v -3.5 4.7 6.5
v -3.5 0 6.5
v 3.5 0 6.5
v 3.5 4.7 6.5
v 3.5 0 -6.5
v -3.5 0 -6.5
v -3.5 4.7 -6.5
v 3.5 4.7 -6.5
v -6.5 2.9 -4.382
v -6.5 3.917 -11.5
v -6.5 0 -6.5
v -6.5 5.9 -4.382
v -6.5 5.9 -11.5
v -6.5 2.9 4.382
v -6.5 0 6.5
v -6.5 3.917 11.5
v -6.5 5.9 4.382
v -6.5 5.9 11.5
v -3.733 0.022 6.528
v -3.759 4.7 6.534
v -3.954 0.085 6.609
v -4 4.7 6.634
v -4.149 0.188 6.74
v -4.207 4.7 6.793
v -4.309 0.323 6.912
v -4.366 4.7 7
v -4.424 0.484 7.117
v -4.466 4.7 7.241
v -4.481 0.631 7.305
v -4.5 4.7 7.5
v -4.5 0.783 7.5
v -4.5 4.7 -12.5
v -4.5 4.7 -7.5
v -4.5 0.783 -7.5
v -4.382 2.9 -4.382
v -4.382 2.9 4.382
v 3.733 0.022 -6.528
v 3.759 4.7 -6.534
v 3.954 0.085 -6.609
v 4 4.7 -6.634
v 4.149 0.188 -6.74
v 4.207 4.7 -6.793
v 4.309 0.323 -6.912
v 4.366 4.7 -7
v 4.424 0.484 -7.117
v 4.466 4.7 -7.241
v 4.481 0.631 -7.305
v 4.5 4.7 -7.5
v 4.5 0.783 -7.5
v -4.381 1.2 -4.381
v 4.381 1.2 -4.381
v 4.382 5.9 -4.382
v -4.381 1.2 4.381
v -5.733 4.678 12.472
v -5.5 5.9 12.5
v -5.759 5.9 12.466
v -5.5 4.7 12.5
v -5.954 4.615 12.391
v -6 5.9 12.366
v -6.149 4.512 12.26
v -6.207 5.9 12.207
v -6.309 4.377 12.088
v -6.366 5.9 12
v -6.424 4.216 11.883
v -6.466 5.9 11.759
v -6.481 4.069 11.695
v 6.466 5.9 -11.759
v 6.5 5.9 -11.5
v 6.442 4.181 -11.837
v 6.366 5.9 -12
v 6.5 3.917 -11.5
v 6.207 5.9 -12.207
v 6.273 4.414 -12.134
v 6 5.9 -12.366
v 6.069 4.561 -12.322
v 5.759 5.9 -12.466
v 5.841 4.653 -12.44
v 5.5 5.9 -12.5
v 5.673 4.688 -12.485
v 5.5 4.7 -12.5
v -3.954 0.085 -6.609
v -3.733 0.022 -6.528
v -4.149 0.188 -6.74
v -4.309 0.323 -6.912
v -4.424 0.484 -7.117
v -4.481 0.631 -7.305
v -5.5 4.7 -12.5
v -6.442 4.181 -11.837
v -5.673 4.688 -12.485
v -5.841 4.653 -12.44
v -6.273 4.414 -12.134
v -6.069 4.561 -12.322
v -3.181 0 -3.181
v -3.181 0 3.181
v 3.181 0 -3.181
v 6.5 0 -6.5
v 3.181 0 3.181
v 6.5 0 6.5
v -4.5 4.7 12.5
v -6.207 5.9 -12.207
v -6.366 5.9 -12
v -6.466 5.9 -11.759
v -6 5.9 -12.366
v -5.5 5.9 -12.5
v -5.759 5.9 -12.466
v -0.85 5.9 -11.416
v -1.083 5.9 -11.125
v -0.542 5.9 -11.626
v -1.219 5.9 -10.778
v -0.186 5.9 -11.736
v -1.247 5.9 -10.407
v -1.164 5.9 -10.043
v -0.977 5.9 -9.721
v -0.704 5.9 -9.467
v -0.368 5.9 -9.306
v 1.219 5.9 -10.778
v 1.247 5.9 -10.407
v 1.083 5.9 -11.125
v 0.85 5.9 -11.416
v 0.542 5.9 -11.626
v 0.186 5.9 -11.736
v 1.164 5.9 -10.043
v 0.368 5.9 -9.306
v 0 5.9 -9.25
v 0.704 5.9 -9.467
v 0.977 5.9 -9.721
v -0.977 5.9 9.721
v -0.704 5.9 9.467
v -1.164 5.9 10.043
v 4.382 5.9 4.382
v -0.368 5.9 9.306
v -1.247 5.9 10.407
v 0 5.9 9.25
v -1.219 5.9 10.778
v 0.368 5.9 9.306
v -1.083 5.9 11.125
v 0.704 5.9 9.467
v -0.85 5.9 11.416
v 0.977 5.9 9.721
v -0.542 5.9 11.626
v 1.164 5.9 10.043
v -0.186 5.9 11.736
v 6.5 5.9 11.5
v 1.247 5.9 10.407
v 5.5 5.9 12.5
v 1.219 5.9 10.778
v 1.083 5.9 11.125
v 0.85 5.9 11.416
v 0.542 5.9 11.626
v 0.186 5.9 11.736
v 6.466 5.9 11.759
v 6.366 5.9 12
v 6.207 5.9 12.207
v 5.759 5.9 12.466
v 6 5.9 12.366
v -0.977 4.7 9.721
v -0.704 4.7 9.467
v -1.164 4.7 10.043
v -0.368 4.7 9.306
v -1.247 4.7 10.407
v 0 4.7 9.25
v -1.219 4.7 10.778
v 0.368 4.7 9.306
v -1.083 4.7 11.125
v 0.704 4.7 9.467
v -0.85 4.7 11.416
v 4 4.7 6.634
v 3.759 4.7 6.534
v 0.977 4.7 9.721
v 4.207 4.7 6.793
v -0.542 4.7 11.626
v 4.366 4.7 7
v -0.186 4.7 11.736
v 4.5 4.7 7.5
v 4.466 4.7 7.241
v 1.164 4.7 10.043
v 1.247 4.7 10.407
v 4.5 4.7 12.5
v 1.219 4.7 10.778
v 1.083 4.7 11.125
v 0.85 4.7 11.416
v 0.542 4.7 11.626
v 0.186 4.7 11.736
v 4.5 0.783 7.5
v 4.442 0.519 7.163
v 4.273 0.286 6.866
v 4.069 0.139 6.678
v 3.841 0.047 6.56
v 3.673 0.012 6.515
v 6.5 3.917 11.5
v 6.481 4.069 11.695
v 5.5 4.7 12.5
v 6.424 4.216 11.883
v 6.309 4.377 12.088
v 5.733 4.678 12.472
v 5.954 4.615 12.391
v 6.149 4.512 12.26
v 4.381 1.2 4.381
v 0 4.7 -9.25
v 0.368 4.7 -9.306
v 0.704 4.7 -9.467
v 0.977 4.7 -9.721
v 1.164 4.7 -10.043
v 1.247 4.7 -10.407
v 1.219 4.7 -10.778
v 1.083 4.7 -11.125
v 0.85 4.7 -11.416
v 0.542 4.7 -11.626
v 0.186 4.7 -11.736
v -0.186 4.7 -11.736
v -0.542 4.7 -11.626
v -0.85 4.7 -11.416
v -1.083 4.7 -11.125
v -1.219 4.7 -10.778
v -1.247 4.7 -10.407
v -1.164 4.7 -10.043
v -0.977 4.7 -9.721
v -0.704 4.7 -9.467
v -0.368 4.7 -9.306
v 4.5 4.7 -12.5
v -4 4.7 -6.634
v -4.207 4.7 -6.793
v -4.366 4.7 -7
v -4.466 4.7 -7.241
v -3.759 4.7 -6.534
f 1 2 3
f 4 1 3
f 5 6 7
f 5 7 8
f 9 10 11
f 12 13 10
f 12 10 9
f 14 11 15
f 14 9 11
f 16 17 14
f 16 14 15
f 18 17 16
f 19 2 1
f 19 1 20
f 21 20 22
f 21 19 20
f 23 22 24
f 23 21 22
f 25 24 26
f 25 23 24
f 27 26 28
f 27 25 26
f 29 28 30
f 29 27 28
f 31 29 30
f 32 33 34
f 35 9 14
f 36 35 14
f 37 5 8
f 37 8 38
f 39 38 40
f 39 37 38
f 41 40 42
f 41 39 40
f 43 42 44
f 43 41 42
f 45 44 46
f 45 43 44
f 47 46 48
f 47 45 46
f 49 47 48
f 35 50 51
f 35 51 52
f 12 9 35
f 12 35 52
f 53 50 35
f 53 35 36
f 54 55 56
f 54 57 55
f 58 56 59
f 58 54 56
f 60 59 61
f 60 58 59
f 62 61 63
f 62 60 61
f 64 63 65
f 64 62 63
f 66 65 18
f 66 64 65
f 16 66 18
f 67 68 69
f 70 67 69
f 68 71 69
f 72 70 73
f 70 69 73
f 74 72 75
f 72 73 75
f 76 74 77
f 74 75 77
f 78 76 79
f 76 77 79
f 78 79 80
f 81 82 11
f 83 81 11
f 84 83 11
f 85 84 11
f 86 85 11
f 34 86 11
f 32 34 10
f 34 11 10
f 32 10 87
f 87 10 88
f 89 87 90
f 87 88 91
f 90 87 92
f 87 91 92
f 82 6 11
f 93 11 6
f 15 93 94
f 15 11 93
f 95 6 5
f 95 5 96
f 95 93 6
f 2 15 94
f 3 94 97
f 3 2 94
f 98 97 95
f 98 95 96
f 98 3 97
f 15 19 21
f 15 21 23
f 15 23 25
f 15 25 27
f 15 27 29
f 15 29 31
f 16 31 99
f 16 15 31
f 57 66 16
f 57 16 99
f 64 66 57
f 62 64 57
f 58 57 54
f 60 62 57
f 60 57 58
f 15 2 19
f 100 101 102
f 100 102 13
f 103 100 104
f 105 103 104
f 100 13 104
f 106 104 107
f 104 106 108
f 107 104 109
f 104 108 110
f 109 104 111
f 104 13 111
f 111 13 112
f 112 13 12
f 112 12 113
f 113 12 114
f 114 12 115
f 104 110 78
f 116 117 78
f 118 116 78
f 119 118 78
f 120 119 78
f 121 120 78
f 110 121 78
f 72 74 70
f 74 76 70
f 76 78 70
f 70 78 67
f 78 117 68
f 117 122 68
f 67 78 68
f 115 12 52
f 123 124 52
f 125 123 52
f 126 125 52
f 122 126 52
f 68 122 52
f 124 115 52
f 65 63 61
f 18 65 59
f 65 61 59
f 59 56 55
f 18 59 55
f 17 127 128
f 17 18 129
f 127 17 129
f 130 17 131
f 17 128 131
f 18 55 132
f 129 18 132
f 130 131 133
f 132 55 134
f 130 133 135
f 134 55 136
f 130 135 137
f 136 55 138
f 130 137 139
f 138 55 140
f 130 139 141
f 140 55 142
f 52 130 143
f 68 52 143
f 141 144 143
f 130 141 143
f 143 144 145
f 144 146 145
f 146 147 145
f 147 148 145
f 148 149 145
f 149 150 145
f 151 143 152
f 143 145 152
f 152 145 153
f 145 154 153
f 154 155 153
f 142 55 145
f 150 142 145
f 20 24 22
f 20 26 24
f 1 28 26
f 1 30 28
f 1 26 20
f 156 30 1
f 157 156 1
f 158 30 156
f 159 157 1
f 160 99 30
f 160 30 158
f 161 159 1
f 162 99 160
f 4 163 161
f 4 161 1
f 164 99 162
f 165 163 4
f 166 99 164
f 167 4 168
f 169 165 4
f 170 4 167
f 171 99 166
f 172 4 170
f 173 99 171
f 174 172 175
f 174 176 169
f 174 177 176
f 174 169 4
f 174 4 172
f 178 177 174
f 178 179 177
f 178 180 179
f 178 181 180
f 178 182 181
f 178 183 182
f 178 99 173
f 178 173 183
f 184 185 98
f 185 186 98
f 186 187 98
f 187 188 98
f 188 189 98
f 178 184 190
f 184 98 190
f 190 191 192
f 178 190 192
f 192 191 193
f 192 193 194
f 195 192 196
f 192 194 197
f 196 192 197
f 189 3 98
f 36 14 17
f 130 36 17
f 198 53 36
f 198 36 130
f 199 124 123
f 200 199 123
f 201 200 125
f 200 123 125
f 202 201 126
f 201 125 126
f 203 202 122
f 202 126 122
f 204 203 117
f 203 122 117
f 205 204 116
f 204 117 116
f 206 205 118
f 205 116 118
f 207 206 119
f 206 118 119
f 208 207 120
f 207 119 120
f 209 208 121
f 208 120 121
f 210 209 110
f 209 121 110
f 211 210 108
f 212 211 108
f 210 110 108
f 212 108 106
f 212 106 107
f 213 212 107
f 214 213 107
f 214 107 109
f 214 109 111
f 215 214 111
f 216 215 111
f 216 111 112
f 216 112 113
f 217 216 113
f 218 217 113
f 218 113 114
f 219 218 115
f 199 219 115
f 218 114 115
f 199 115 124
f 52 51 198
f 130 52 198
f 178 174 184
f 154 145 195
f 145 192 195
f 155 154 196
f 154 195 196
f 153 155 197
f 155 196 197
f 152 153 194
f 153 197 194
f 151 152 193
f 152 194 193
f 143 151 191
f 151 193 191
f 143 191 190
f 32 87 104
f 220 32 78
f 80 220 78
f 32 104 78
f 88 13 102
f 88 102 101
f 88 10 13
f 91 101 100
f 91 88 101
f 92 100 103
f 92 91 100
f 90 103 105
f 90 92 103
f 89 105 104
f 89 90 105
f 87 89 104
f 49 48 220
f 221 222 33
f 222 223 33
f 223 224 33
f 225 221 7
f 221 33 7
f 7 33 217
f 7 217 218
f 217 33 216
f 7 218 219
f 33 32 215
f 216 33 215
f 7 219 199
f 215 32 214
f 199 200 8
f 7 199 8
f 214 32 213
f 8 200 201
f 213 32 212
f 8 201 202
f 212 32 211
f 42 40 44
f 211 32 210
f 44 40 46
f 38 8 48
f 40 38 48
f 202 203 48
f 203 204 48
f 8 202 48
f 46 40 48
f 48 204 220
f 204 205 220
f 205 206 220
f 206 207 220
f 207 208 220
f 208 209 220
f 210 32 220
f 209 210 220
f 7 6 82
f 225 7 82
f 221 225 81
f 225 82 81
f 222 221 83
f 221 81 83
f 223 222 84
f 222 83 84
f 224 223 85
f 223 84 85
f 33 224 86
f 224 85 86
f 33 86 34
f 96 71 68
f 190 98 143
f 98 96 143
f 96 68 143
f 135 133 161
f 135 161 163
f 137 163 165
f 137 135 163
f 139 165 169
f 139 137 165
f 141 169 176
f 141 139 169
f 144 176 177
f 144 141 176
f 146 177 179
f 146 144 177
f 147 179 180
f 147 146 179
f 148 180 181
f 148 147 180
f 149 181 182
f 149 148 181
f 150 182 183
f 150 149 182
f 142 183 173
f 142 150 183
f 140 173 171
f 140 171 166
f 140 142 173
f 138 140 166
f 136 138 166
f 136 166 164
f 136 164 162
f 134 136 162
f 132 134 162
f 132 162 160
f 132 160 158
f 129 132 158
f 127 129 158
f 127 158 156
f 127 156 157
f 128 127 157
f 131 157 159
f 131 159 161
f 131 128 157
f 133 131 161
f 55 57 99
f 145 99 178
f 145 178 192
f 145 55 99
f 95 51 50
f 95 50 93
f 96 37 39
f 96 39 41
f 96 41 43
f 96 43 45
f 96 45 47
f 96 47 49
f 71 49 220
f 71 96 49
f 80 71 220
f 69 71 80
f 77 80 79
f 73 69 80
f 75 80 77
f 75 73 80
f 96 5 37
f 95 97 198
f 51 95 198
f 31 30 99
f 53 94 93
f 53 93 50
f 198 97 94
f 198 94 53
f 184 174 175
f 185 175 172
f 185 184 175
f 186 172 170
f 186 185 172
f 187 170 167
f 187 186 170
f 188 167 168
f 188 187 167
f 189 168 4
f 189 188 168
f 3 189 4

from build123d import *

# Parameters (mm, degrees)
SKETCH1_W           = 8.763
SKETCH1_H           = 8.763
SKETCH1_W_2         = 5.763
SKETCH1_H_2         = 5.763
BOSS_EXTRUDE1_DEPTH = 1.2
SKETCH2_W           = 13
SKETCH2_H           = 13
SKETCH2_W_2         = 8.763
SKETCH2_H_2         = 8.763
BOSS_EXTRUDE3_DEPTH = 5.9
CHAMFER1_SIZE       = 1.5
SKETCH3_W           = 13
SKETCH3_H           = 6
SKETCH3_R           = 1.25
BOSS_EXTRUDE4_DEPTH = 1.2
BOSS_EXTRUDE5_DEPTH = 2
FILLET1_R           = 1
CUT_EXTRUDE1_REACH  = 20.975
SKETCH4_W           = 8.763
SKETCH4_H           = 3


with BuildPart() as part:
    # Sketch1 → Boss-Extrude1 (new body)
    with BuildSketch(Plane(origin=(0, 0, 0), x_dir=(1, 0, 0), z_dir=(0, 1, 0))):
        Rectangle(SKETCH1_W, SKETCH1_H)
        Rectangle(SKETCH1_W_2, SKETCH1_H_2, mode=Mode.SUBTRACT)
    extrude(amount=BOSS_EXTRUDE1_DEPTH)

    # Sketch2 → Boss-Extrude3 (add)
    with BuildSketch(Plane.XZ):
        Rectangle(SKETCH2_W, SKETCH2_H)
        Rectangle(SKETCH2_W_2, SKETCH2_H_2, mode=Mode.SUBTRACT)
    extrude(amount=-BOSS_EXTRUDE3_DEPTH)

    # Chamfer1
    # the kernel refuses this chamfer: 1.5 mm, written as the material it takes off along each edge
    with BuildSketch(Plane(origin=(2.8815, 1.2, -2.8815), x_dir=(0, 0.02749587661058634, -0.9996219169112968), z_dir=(-1, 0, 0))) as chamfer1_piece_1_section:
        Polygon((CHAMFER1_SIZE * 0.999621916911, CHAMFER1_SIZE * 0.0274958766106), (-CHAMFER1_SIZE * 0.0274958766106, CHAMFER1_SIZE * 0.999621916911), (0, 0), align=None)
    chamfer1_piece_1 = extrude(amount=5.763, mode=Mode.PRIVATE)
    chamfer1_piece_1 = split(chamfer1_piece_1, bisect_by=Plane(origin=(0, 0.704393769, -4.3815), z_dir=(0, 0, 1)), keep=Keep.TOP, mode=Mode.PRIVATE)
    add(chamfer1_piece_1, mode=Mode.SUBTRACT)
    with BuildSketch(Plane(origin=(2.8815, 1.2, 2.8815), x_dir=(-0.02749587661058649, -0.9996219169112968, 0), z_dir=(0, 0, -1))) as chamfer1_piece_2_section:
        Polygon((CHAMFER1_SIZE * 0.999621916911, -CHAMFER1_SIZE * 0.0274958766106), (-CHAMFER1_SIZE * 0.0274958766106, -CHAMFER1_SIZE * 0.999621916911), (0, 0), align=None)
    chamfer1_piece_2 = extrude(amount=5.763, mode=Mode.PRIVATE)
    chamfer1_piece_2 = split(chamfer1_piece_2, bisect_by=Plane(origin=(4.3815, 0.704393769, 0), z_dir=(-1, 0, 0)), keep=Keep.TOP, mode=Mode.PRIVATE)
    add(chamfer1_piece_2, mode=Mode.SUBTRACT)
    with BuildSketch(Plane(origin=(-2.8815, 1.2, 2.8815), x_dir=(0, -0.9996219169112968, -0.02749587661058649), z_dir=(1, 0, 0))) as chamfer1_piece_3_section:
        Polygon((CHAMFER1_SIZE * 0.999621916911, -CHAMFER1_SIZE * 0.0274958766106), (-CHAMFER1_SIZE * 0.0274958766106, -CHAMFER1_SIZE * 0.999621916911), (0, 0), align=None)
    chamfer1_piece_3 = extrude(amount=5.763, mode=Mode.PRIVATE)
    chamfer1_piece_3 = split(chamfer1_piece_3, bisect_by=Plane(origin=(0, 0.704393769, 4.3815), z_dir=(0, 0, -1)), keep=Keep.TOP, mode=Mode.PRIVATE)
    add(chamfer1_piece_3, mode=Mode.SUBTRACT)
    with BuildSketch(Plane(origin=(-2.8815, 1.2, -2.8815), x_dir=(0.02749587661058649, -0.9996219169112968, 0), z_dir=(0, 0, 1))) as chamfer1_piece_4_section:
        Polygon((CHAMFER1_SIZE * 0.999621916911, -CHAMFER1_SIZE * 0.0274958766106), (-CHAMFER1_SIZE * 0.0274958766106, -CHAMFER1_SIZE * 0.999621916911), (0, 0), align=None)
    chamfer1_piece_4 = extrude(amount=5.763, mode=Mode.PRIVATE)
    chamfer1_piece_4 = split(chamfer1_piece_4, bisect_by=Plane(origin=(-4.3815, 0.704393769, 0), z_dir=(1, 0, 0)), keep=Keep.TOP, mode=Mode.PRIVATE)
    add(chamfer1_piece_4, mode=Mode.SUBTRACT)
    with BuildSketch(Plane(origin=(2.8815, 1.2, 2.8815), x_dir=(-0.02749587661058649, -0.9996219169112968, 0), z_dir=(0, 0, -1))) as chamfer1_piece_5a_section:
        Polygon((CHAMFER1_SIZE * 0.999621916911, -CHAMFER1_SIZE * 0.0274958766106), (-CHAMFER1_SIZE * 0.0274958766106, -CHAMFER1_SIZE * 0.999621916911), (0, 0), align=None)
    chamfer1_piece_5a = extrude(amount=9.620524482, mode=Mode.PRIVATE)
    chamfer1_piece_5a = split(chamfer1_piece_5a, bisect_by=Plane(origin=(3.374451501, 0.704393769, -2.8815), z_dir=(0, 0, -1)), keep=Keep.TOP, mode=Mode.PRIVATE)
    chamfer1_piece_5a = split(chamfer1_piece_5a, bisect_by=Plane(origin=(3.374451501, 0.704393769, -4.3815), z_dir=(0, 0, 1)), keep=Keep.TOP, mode=Mode.PRIVATE)
    chamfer1_piece_5a = split(chamfer1_piece_5a, bisect_by=Plane(origin=(4.3815, 0.704393769, -3.6315), z_dir=(-1, 0, 0)), keep=Keep.TOP, mode=Mode.PRIVATE)
    with BuildSketch(Plane(origin=(6.739024482, 1.2, -2.8815), x_dir=(0, 0.02749587661058634, -0.9996219169112968), z_dir=(-1, 0, 0))) as chamfer1_piece_5b_section:
        Polygon((CHAMFER1_SIZE * 0.999621916911, CHAMFER1_SIZE * 0.0274958766106), (-CHAMFER1_SIZE * 0.0274958766106, CHAMFER1_SIZE * 0.999621916911), (0, 0), align=None)
    chamfer1_piece_5b = extrude(amount=9.620524482, mode=Mode.PRIVATE)
    chamfer1_piece_5b = split(chamfer1_piece_5b, bisect_by=Plane(origin=(2.8815, 0.704393769, -3.374451501), z_dir=(1, 0, 0)), keep=Keep.TOP, mode=Mode.PRIVATE)
    chamfer1_piece_5b = split(chamfer1_piece_5b, bisect_by=Plane(origin=(3.6315, 0.704393769, -4.3815), z_dir=(0, 0, 1)), keep=Keep.TOP, mode=Mode.PRIVATE)
    chamfer1_piece_5b = split(chamfer1_piece_5b, bisect_by=Plane(origin=(4.3815, 0.704393769, -3.374451501), z_dir=(-1, 0, 0)), keep=Keep.TOP, mode=Mode.PRIVATE)
    chamfer1_piece_5 = chamfer1_piece_5a & chamfer1_piece_5b
    add(chamfer1_piece_5, mode=Mode.SUBTRACT)
    with BuildSketch(Plane(origin=(-2.8815, 1.2, -6.739024482), x_dir=(0.02749587661058649, -0.9996219169112968, 0), z_dir=(0, 0, 1))) as chamfer1_piece_6a_section:
        Polygon((CHAMFER1_SIZE * 0.999621916911, -CHAMFER1_SIZE * 0.0274958766106), (-CHAMFER1_SIZE * 0.0274958766106, -CHAMFER1_SIZE * 0.999621916911), (0, 0), align=None)
    chamfer1_piece_6a = extrude(amount=9.620524482, mode=Mode.PRIVATE)
    chamfer1_piece_6a = split(chamfer1_piece_6a, bisect_by=Plane(origin=(-3.374451501, 0.704393769, -2.8815), z_dir=(0, 0, -1)), keep=Keep.TOP, mode=Mode.PRIVATE)
    chamfer1_piece_6a = split(chamfer1_piece_6a, bisect_by=Plane(origin=(-3.374451501, 0.704393769, -4.3815), z_dir=(0, 0, 1)), keep=Keep.TOP, mode=Mode.PRIVATE)
    chamfer1_piece_6a = split(chamfer1_piece_6a, bisect_by=Plane(origin=(-4.3815, 0.704393769, -3.6315), z_dir=(1, 0, 0)), keep=Keep.TOP, mode=Mode.PRIVATE)
    with BuildSketch(Plane(origin=(2.8815, 1.2, -2.8815), x_dir=(0, 0.02749587661058634, -0.9996219169112968), z_dir=(-1, 0, 0))) as chamfer1_piece_6b_section:
        Polygon((CHAMFER1_SIZE * 0.999621916911, CHAMFER1_SIZE * 0.0274958766106), (-CHAMFER1_SIZE * 0.0274958766106, CHAMFER1_SIZE * 0.999621916911), (0, 0), align=None)
    chamfer1_piece_6b = extrude(amount=9.620524482, mode=Mode.PRIVATE)
    chamfer1_piece_6b = split(chamfer1_piece_6b, bisect_by=Plane(origin=(-2.8815, 0.704393769, -3.374451501), z_dir=(-1, 0, 0)), keep=Keep.TOP, mode=Mode.PRIVATE)
    chamfer1_piece_6b = split(chamfer1_piece_6b, bisect_by=Plane(origin=(-3.6315, 0.704393769, -4.3815), z_dir=(0, 0, 1)), keep=Keep.TOP, mode=Mode.PRIVATE)
    chamfer1_piece_6b = split(chamfer1_piece_6b, bisect_by=Plane(origin=(-4.3815, 0.704393769, -3.374451501), z_dir=(1, 0, 0)), keep=Keep.TOP, mode=Mode.PRIVATE)
    chamfer1_piece_6 = chamfer1_piece_6a & chamfer1_piece_6b
    add(chamfer1_piece_6, mode=Mode.SUBTRACT)
    with BuildSketch(Plane(origin=(-2.8815, 1.2, 2.8815), x_dir=(0, -0.9996219169112968, -0.02749587661058649), z_dir=(1, 0, 0))) as chamfer1_piece_7a_section:
        Polygon((CHAMFER1_SIZE * 0.999621916911, -CHAMFER1_SIZE * 0.0274958766106), (-CHAMFER1_SIZE * 0.0274958766106, -CHAMFER1_SIZE * 0.999621916911), (0, 0), align=None)
    chamfer1_piece_7a = extrude(amount=9.620524482, mode=Mode.PRIVATE)
    chamfer1_piece_7a = split(chamfer1_piece_7a, bisect_by=Plane(origin=(2.8815, 0.704393769, 3.374451501), z_dir=(1, 0, 0)), keep=Keep.TOP, mode=Mode.PRIVATE)
    chamfer1_piece_7a = split(chamfer1_piece_7a, bisect_by=Plane(origin=(4.3815, 0.704393769, 3.374451501), z_dir=(-1, 0, 0)), keep=Keep.TOP, mode=Mode.PRIVATE)
    chamfer1_piece_7a = split(chamfer1_piece_7a, bisect_by=Plane(origin=(3.6315, 0.704393769, 4.3815), z_dir=(0, 0, -1)), keep=Keep.TOP, mode=Mode.PRIVATE)
    with BuildSketch(Plane(origin=(2.8815, 1.2, 6.739024482), x_dir=(-0.02749587661058649, -0.9996219169112968, 0), z_dir=(0, 0, -1))) as chamfer1_piece_7b_section:
        Polygon((CHAMFER1_SIZE * 0.999621916911, -CHAMFER1_SIZE * 0.0274958766106), (-CHAMFER1_SIZE * 0.0274958766106, -CHAMFER1_SIZE * 0.999621916911), (0, 0), align=None)
    chamfer1_piece_7b = extrude(amount=9.620524482, mode=Mode.PRIVATE)
    chamfer1_piece_7b = split(chamfer1_piece_7b, bisect_by=Plane(origin=(3.374451501, 0.704393769, 2.8815), z_dir=(0, 0, 1)), keep=Keep.TOP, mode=Mode.PRIVATE)
    chamfer1_piece_7b = split(chamfer1_piece_7b, bisect_by=Plane(origin=(4.3815, 0.704393769, 3.6315), z_dir=(-1, 0, 0)), keep=Keep.TOP, mode=Mode.PRIVATE)
    chamfer1_piece_7b = split(chamfer1_piece_7b, bisect_by=Plane(origin=(3.374451501, 0.704393769, 4.3815), z_dir=(0, 0, -1)), keep=Keep.TOP, mode=Mode.PRIVATE)
    chamfer1_piece_7 = chamfer1_piece_7a & chamfer1_piece_7b
    add(chamfer1_piece_7, mode=Mode.SUBTRACT)
    with BuildSketch(Plane(origin=(-6.739024482, 1.2, 2.8815), x_dir=(0, -0.9996219169112968, -0.02749587661058649), z_dir=(1, 0, 0))) as chamfer1_piece_8a_section:
        Polygon((CHAMFER1_SIZE * 0.999621916911, -CHAMFER1_SIZE * 0.0274958766106), (-CHAMFER1_SIZE * 0.0274958766106, -CHAMFER1_SIZE * 0.999621916911), (0, 0), align=None)
    chamfer1_piece_8a = extrude(amount=9.620524482, mode=Mode.PRIVATE)
    chamfer1_piece_8a = split(chamfer1_piece_8a, bisect_by=Plane(origin=(-2.8815, 0.704393769, 3.374451501), z_dir=(-1, 0, 0)), keep=Keep.TOP, mode=Mode.PRIVATE)
    chamfer1_piece_8a = split(chamfer1_piece_8a, bisect_by=Plane(origin=(-3.6315, 0.704393769, 4.3815), z_dir=(0, 0, -1)), keep=Keep.TOP, mode=Mode.PRIVATE)
    chamfer1_piece_8a = split(chamfer1_piece_8a, bisect_by=Plane(origin=(-4.3815, 0.704393769, 3.374451501), z_dir=(1, 0, 0)), keep=Keep.TOP, mode=Mode.PRIVATE)
    with BuildSketch(Plane(origin=(-2.8815, 1.2, -2.8815), x_dir=(0.02749587661058649, -0.9996219169112968, 0), z_dir=(0, 0, 1))) as chamfer1_piece_8b_section:
        Polygon((CHAMFER1_SIZE * 0.999621916911, -CHAMFER1_SIZE * 0.0274958766106), (-CHAMFER1_SIZE * 0.0274958766106, -CHAMFER1_SIZE * 0.999621916911), (0, 0), align=None)
    chamfer1_piece_8b = extrude(amount=9.620524482, mode=Mode.PRIVATE)
    chamfer1_piece_8b = split(chamfer1_piece_8b, bisect_by=Plane(origin=(-3.374451501, 0.704393769, 2.8815), z_dir=(0, 0, 1)), keep=Keep.TOP, mode=Mode.PRIVATE)
    chamfer1_piece_8b = split(chamfer1_piece_8b, bisect_by=Plane(origin=(-3.374451501, 0.704393769, 4.3815), z_dir=(0, 0, -1)), keep=Keep.TOP, mode=Mode.PRIVATE)
    chamfer1_piece_8b = split(chamfer1_piece_8b, bisect_by=Plane(origin=(-4.3815, 0.704393769, 3.6315), z_dir=(1, 0, 0)), keep=Keep.TOP, mode=Mode.PRIVATE)
    chamfer1_piece_8 = chamfer1_piece_8a & chamfer1_piece_8b
    add(chamfer1_piece_8, mode=Mode.SUBTRACT)

    # Sketch3 → Boss-Extrude4 (add)
    with BuildSketch(Plane(origin=(0, 5.9, 0), x_dir=(1, 0, 0), z_dir=(0, 1, 0))):
        with Locations((0, 9.5)):
            Rectangle(SKETCH3_W, SKETCH3_H)
        with Locations(Location((0, 10.5, 0), (0, 0, 270))):
            Circle(SKETCH3_R, mode=Mode.SUBTRACT)
    boss_extrude4 = extrude(amount=-BOSS_EXTRUDE4_DEPTH)

    # Mirror1: Boss-Extrude4 across plane
    add(boss_extrude4.mirror(Plane.XY))

    # Sketch5 → Boss-Extrude5 (add)
    with BuildSketch(Plane.ZY.offset(6.5)):
        Polygon((6.5, 4.7), (6.5, 0), (12.5, 4.7), align=None)
        Polygon((-6.5, 4.7), (-6.5, 0), (-12.5, 4.7), align=None)
    boss_extrude5 = extrude(amount=-BOSS_EXTRUDE5_DEPTH)

    # Mirror2: Boss-Extrude5 across plane
    add(boss_extrude5.mirror(Plane(origin=(0, 0, 0), x_dir=(0, 0, 1), z_dir=(1, 0, 0))))

    # Fillet1
    fillet1_edges = [part.edges().sort_by_distance(p)[0] for p in [
        (-4.5, 2.35, -6.5),
        (4.5, 2.35, 6.5),
        (4.5, 2.35, -6.5),
        (-6.5, 5.3, -12.5),
        (6.5, 5.3, -12.5),
        (-6.5, 5.3, 12.5),
        (6.5, 5.3, 12.5),
        (-4.5, 2.35, 6.5),
    ]]
    fillet(fillet1_edges, radius=FILLET1_R)

    # Sketch4 → Cut-Extrude1 (cut, up to next)
    with BuildSketch(Plane.ZY.offset(6.5), mode=Mode.PRIVATE) as cut_extrude1_sk1:
        with Locations((0, 4.4)):
            Rectangle(SKETCH4_W, SKETCH4_H)
    cut_extrude1_tool1 = extrude(cut_extrude1_sk1.sketch, amount=-CUT_EXTRUDE1_REACH, mode=Mode.PRIVATE) & part.part
    add(cut_extrude1_tool1.solids().sort_by_distance((-6.5, 4.4, 0))[0], mode=Mode.SUBTRACT)


solid = part.part
